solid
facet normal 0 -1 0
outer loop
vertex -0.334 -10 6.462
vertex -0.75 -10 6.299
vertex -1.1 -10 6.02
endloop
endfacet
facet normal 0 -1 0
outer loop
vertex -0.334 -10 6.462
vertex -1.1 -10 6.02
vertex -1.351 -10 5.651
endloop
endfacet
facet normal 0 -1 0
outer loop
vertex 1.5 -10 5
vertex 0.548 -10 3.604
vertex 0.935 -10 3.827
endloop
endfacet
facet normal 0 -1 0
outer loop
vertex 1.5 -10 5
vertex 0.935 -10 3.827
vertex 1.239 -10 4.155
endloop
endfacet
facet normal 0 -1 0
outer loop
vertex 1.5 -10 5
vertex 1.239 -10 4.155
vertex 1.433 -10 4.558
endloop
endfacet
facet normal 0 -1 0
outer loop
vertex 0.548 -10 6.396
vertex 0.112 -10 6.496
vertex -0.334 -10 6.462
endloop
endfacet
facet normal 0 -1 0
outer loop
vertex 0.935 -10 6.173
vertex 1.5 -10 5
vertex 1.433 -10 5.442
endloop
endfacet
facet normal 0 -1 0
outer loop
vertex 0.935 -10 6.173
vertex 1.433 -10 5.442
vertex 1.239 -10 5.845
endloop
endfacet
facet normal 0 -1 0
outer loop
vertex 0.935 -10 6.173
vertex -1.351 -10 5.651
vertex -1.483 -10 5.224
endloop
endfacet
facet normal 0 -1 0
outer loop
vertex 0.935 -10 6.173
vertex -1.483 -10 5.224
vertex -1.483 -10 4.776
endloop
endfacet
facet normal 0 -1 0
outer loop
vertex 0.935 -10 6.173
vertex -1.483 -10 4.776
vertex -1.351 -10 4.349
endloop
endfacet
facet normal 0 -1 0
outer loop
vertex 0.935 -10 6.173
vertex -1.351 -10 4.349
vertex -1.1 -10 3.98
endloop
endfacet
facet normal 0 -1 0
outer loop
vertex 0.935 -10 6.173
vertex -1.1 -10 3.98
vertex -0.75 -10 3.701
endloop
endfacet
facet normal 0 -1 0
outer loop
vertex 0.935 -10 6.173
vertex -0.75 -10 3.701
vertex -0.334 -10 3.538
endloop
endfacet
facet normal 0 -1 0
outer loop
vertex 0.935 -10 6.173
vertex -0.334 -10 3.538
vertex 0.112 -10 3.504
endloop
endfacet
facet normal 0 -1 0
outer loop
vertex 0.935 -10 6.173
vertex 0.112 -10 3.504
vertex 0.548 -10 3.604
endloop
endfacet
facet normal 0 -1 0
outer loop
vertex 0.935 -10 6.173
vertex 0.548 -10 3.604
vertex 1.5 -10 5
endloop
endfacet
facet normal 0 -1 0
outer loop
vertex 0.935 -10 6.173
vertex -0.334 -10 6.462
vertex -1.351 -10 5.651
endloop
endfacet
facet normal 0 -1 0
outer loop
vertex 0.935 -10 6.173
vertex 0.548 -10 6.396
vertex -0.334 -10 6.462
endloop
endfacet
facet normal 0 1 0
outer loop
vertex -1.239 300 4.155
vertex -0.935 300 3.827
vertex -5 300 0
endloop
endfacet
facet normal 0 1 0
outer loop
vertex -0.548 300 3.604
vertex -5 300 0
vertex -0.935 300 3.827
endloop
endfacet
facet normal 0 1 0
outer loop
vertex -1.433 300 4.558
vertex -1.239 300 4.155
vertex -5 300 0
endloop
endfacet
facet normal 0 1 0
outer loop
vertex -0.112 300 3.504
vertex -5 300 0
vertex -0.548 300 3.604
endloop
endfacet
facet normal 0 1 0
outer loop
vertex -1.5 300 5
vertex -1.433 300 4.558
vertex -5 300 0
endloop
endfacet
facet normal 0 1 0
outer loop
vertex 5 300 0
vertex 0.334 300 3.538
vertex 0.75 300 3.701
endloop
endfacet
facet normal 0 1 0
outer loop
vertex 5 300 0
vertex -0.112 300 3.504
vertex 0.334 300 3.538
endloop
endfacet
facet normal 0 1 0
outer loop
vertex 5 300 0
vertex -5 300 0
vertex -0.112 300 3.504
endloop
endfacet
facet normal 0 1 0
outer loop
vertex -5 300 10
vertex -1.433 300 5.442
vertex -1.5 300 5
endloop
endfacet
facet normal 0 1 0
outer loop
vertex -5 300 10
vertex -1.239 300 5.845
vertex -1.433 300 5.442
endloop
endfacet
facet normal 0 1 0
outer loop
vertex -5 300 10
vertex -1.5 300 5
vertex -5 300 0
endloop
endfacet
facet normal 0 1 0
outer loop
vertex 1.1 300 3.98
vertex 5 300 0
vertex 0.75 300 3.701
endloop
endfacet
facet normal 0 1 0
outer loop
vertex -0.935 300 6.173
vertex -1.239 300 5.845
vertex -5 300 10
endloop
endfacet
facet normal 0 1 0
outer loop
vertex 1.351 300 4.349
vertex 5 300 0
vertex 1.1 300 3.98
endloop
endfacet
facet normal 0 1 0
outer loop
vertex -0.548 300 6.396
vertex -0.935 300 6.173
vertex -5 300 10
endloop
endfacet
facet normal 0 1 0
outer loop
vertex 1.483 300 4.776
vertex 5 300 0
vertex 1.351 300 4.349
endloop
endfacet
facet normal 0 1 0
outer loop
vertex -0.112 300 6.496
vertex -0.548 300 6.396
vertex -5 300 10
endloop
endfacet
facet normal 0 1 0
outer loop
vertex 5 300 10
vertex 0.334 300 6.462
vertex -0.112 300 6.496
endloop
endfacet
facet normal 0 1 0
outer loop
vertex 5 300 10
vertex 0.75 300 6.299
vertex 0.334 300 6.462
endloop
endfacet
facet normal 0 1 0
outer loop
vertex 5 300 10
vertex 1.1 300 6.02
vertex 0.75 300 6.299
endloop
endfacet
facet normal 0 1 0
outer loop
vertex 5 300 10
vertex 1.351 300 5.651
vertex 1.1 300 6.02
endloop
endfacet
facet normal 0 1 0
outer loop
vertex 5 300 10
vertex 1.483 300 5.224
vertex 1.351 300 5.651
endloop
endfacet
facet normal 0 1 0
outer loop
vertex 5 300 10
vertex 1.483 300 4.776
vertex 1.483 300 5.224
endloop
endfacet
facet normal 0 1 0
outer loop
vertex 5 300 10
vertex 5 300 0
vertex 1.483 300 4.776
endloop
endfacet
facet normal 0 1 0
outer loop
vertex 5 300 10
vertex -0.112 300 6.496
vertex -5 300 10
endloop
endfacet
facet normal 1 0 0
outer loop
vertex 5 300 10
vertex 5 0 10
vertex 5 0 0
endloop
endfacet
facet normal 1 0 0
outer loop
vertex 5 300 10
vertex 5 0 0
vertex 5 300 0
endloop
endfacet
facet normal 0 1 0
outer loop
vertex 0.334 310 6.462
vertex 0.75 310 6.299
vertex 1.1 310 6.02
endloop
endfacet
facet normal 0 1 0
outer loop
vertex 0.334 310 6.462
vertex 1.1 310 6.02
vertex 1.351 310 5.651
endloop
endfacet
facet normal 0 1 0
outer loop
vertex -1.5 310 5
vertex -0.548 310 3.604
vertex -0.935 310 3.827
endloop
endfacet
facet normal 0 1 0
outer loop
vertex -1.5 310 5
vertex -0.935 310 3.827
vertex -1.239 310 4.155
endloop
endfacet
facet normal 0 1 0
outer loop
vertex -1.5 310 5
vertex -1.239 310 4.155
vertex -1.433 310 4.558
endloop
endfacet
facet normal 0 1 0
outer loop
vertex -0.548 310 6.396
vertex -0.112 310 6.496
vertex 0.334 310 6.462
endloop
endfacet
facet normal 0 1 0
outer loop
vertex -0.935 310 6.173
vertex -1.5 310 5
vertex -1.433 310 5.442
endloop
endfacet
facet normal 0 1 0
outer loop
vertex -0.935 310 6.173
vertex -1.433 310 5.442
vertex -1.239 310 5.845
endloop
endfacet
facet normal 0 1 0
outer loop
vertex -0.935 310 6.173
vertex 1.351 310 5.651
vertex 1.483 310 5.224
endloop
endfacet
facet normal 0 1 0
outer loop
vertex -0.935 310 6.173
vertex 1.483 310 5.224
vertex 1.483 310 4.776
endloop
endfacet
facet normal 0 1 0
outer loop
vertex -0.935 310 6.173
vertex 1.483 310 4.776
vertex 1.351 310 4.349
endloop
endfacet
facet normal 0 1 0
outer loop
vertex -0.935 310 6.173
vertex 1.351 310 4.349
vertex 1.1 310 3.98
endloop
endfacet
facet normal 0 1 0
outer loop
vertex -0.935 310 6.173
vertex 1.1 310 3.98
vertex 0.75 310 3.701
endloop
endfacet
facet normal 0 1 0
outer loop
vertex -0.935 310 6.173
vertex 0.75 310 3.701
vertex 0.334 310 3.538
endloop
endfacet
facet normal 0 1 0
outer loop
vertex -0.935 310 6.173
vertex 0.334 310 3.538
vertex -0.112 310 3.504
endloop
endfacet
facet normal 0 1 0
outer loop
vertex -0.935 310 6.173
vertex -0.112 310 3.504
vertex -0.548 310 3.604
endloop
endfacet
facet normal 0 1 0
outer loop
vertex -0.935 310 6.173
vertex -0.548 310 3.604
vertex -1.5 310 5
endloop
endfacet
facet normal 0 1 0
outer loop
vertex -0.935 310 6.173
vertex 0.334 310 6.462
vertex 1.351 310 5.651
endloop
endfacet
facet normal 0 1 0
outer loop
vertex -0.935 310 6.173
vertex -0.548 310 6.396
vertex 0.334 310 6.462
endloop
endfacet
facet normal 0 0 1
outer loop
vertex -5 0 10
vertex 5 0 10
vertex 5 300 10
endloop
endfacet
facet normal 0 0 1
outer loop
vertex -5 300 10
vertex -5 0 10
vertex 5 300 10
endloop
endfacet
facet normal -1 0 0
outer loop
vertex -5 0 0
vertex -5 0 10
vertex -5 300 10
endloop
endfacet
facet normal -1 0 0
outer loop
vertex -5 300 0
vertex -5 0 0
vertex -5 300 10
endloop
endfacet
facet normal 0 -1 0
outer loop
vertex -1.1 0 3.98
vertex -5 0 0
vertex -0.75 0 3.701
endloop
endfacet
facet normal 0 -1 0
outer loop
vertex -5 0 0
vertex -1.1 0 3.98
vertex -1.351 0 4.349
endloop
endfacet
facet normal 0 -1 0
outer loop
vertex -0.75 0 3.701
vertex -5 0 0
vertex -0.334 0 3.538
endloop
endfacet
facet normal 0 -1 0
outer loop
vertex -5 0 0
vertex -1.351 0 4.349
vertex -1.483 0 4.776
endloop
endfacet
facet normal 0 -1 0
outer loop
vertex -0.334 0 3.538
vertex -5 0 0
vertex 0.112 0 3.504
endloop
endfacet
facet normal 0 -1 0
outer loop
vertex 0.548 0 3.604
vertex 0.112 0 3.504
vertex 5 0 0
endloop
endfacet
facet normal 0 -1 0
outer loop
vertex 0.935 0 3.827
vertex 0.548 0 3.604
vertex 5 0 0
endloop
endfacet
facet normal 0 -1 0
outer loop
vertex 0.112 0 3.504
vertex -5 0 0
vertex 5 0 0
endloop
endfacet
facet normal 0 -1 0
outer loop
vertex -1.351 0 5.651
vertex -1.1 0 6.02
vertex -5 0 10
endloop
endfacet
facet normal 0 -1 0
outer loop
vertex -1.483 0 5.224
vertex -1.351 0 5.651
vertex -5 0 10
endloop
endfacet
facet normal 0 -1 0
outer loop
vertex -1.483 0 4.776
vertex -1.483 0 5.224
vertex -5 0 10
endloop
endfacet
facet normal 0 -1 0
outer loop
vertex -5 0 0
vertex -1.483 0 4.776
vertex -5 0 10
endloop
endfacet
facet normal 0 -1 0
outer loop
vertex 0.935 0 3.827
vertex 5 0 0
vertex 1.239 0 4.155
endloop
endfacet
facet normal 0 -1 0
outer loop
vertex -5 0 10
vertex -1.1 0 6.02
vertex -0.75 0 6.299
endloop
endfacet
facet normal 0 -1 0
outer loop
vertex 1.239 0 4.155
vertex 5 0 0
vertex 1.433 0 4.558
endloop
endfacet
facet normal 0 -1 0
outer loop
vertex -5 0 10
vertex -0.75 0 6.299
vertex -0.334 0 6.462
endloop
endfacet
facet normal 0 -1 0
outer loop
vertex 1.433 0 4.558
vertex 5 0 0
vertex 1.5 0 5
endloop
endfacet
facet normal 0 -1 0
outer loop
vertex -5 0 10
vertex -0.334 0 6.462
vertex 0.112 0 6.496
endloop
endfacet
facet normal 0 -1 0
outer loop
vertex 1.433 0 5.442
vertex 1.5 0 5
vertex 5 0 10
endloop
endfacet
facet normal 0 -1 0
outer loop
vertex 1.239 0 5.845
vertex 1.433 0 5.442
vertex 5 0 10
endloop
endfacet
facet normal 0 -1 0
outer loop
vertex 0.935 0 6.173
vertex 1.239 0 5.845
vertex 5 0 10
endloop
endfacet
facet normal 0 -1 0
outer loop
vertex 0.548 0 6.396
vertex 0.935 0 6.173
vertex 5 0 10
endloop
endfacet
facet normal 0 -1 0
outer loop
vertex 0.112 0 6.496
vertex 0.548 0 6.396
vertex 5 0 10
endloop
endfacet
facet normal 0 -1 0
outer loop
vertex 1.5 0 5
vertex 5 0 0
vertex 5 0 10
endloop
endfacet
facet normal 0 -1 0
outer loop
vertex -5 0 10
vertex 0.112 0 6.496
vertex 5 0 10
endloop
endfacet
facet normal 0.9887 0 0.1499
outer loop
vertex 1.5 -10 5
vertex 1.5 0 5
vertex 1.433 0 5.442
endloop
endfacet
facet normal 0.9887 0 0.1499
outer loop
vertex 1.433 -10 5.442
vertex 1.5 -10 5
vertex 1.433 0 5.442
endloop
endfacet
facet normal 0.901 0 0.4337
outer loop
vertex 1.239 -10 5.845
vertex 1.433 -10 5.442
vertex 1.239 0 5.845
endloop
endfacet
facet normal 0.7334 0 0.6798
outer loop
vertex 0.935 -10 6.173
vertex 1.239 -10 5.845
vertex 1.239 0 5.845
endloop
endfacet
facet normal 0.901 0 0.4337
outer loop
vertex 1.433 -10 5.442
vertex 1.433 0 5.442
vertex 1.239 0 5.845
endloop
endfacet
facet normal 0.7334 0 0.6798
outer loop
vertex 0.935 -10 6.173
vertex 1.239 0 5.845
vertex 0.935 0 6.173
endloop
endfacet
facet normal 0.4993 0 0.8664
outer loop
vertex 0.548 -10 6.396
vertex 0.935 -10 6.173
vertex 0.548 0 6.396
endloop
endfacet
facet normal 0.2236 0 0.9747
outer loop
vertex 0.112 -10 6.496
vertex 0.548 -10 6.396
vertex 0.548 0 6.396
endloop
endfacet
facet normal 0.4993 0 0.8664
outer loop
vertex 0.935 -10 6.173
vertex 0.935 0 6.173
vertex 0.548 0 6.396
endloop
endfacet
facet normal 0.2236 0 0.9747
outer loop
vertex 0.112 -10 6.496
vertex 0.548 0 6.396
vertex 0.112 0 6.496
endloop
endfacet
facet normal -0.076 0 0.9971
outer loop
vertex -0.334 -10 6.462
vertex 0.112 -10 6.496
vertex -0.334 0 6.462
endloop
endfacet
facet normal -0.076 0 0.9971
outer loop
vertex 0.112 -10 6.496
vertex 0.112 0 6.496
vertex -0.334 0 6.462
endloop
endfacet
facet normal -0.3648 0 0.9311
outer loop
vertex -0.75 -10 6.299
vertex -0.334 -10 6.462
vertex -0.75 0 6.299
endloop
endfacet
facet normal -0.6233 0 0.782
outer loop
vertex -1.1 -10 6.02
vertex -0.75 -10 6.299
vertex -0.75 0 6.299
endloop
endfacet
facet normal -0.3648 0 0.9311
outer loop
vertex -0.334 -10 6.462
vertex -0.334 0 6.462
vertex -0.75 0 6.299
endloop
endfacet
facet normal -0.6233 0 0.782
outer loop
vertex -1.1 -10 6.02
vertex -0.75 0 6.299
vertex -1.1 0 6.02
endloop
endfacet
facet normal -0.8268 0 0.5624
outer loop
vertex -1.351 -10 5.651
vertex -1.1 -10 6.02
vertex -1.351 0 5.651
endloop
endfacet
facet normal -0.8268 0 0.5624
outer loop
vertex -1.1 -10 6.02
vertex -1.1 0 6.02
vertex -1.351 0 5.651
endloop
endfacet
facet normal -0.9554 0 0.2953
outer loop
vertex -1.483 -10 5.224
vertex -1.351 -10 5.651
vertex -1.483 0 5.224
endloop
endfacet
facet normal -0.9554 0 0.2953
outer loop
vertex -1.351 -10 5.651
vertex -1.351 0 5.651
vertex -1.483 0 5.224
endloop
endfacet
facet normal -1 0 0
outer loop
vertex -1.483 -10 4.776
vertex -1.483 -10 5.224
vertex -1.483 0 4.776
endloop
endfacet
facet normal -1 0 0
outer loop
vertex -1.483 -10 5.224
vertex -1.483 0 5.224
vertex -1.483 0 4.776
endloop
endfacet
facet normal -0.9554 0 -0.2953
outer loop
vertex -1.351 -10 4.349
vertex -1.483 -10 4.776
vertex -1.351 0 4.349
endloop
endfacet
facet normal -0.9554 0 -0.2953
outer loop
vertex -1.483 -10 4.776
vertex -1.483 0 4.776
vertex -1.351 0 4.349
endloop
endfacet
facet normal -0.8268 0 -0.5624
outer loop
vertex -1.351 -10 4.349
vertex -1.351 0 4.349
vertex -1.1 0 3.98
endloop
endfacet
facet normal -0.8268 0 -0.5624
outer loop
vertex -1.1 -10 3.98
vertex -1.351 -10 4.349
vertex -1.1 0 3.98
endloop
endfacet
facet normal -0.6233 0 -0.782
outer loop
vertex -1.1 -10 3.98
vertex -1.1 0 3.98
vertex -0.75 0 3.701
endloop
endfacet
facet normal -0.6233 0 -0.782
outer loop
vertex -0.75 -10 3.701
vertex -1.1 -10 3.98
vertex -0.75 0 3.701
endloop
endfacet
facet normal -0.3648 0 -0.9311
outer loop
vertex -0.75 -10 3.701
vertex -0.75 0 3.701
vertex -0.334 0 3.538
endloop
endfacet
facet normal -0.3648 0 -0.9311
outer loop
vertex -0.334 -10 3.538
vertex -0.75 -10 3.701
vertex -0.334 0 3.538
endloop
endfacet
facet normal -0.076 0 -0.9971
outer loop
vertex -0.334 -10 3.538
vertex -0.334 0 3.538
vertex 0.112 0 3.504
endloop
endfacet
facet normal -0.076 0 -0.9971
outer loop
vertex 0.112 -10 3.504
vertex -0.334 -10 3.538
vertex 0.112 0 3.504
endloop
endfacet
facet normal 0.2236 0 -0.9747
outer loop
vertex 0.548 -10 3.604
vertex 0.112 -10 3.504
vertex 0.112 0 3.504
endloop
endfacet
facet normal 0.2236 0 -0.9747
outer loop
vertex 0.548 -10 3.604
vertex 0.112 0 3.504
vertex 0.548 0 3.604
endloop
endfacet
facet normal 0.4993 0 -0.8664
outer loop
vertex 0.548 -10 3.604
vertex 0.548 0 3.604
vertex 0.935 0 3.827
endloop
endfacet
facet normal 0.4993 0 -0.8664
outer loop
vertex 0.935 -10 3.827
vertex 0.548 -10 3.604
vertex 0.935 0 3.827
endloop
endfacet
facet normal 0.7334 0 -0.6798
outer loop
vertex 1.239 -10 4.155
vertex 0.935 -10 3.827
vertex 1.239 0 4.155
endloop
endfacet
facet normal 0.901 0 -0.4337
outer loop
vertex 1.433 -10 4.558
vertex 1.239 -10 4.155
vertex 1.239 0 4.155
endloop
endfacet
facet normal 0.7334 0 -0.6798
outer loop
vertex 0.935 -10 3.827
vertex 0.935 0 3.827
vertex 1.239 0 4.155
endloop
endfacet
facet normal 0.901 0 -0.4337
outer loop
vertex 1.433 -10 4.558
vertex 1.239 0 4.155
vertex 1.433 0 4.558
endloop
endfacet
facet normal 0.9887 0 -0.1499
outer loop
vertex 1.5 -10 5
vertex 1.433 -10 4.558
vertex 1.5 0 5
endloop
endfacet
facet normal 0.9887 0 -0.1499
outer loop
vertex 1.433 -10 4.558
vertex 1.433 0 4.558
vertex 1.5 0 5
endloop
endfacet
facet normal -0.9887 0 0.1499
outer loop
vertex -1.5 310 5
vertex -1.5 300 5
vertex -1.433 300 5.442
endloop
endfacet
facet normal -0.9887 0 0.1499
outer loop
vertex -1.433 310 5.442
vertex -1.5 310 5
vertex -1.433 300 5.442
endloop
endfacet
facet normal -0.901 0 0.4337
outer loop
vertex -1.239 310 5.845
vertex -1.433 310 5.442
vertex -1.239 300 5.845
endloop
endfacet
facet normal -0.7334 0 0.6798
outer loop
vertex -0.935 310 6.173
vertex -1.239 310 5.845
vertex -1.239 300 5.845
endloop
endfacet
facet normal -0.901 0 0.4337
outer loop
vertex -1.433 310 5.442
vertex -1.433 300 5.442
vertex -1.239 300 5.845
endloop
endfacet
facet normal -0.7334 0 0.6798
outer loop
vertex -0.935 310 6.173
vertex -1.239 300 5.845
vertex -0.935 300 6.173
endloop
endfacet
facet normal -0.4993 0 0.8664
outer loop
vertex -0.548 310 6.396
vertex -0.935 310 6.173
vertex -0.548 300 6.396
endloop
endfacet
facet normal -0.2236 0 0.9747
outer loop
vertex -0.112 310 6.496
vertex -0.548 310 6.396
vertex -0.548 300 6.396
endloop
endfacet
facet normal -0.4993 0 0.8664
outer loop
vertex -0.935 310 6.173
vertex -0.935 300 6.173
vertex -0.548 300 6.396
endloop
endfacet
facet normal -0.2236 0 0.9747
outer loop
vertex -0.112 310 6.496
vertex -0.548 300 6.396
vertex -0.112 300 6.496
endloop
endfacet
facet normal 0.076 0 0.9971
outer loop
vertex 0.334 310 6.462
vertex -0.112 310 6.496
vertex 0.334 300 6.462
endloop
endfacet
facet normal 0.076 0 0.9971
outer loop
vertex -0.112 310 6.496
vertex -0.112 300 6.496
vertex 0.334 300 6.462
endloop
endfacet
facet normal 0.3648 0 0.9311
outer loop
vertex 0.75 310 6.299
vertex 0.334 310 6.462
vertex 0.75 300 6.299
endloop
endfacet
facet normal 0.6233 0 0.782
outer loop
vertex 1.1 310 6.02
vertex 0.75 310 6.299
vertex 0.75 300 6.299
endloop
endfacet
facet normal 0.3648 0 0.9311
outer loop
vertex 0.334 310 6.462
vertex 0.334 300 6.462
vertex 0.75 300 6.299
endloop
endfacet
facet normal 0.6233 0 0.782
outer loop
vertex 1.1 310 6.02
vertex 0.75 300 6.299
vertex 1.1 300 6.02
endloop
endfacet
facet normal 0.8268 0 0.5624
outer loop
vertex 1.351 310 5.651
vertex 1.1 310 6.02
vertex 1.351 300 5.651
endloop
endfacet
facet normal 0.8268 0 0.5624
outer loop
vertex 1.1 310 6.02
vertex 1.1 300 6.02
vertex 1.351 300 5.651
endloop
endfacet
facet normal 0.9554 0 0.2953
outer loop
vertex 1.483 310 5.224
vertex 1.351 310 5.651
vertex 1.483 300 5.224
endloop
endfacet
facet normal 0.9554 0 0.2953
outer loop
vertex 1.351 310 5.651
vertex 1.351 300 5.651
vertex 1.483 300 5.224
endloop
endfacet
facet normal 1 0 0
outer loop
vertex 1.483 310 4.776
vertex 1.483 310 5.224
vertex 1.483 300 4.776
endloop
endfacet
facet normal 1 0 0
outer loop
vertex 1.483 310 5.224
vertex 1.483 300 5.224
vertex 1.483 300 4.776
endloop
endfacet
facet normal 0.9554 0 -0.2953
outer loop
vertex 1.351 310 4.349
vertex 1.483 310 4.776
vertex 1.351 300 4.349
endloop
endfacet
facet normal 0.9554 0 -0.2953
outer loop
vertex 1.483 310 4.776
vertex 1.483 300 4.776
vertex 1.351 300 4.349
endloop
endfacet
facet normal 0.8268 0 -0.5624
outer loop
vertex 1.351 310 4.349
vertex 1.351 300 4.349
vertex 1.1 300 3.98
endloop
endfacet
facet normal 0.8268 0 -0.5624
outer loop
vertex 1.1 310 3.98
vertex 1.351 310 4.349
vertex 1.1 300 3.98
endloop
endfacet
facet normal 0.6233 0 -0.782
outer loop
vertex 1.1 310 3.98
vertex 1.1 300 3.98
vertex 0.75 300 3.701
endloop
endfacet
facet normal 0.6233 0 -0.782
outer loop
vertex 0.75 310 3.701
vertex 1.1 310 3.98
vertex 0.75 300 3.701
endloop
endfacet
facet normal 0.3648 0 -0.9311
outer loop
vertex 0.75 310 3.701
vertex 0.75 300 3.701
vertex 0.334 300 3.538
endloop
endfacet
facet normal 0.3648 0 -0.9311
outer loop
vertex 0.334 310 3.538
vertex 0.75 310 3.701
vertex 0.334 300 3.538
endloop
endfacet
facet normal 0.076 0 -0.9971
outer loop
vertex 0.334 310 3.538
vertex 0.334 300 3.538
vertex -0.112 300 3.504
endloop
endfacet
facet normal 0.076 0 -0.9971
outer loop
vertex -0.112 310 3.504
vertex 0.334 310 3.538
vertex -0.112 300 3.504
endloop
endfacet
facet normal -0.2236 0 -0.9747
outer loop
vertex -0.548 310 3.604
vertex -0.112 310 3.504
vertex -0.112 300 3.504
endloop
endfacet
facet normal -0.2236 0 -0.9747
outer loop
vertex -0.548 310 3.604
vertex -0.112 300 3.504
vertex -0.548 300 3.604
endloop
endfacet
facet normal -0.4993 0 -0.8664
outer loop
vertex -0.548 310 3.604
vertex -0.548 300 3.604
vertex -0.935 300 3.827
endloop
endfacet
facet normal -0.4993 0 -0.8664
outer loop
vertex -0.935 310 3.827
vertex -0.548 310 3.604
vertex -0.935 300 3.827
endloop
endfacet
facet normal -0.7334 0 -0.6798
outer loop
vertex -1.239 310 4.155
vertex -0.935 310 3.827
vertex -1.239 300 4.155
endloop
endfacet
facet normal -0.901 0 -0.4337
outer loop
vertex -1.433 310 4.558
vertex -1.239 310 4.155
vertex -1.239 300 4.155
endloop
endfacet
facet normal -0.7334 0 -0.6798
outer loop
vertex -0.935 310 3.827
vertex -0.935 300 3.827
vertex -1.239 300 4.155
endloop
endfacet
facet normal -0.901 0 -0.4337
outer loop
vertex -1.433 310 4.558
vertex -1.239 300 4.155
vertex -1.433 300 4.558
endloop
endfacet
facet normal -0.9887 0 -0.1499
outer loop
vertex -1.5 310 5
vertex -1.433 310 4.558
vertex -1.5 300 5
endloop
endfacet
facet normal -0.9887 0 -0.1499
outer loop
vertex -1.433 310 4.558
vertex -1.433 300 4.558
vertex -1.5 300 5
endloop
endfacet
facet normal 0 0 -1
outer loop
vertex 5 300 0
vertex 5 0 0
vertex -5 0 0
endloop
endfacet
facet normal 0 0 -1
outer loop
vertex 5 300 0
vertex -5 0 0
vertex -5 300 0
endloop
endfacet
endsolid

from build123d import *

# Parameters (mm, degrees)
F0_W       = 300
F0_H       = 10
F1_DEPTH   = 5
F2_R       = 1.5
F1_FACE1_W = 10
F1_FACE1_H = 10
F3_DEPTH   = 10
F4_R       = 1.5
F5_DEPTH   = 10


with BuildPart() as f1:
    # F0 (on Right) → F1 (new body, symmetric)
    with BuildSketch(Plane.YZ):
        with Locations((150, 5)):
            Rectangle(F0_W, F0_H)
    extrude(amount=F1_DEPTH, both=True)

    # F2 (on face) + F1_face1 (on face) → F3 (join)
    with BuildSketch(Plane.XZ):
        with Locations((0, 5)):
            Circle(F2_R)
    with BuildSketch(Plane(origin=(0, 300, 5), x_dir=(-1, 0, 0), z_dir=(0, 1, 0))):
        Rectangle(F1_FACE1_W, F1_FACE1_H)
    extrude(amount=F3_DEPTH, dir=(0, -1, 0))

    # F4 (on face) → F5 (join)
    with BuildSketch(Plane(origin=(0, 300, 0), x_dir=(-1, 0, 0), z_dir=(0, 1, 0))):
        with Locations((0, 5)):
            Circle(F4_R)
    extrude(amount=F5_DEPTH)


solid = f1.part
